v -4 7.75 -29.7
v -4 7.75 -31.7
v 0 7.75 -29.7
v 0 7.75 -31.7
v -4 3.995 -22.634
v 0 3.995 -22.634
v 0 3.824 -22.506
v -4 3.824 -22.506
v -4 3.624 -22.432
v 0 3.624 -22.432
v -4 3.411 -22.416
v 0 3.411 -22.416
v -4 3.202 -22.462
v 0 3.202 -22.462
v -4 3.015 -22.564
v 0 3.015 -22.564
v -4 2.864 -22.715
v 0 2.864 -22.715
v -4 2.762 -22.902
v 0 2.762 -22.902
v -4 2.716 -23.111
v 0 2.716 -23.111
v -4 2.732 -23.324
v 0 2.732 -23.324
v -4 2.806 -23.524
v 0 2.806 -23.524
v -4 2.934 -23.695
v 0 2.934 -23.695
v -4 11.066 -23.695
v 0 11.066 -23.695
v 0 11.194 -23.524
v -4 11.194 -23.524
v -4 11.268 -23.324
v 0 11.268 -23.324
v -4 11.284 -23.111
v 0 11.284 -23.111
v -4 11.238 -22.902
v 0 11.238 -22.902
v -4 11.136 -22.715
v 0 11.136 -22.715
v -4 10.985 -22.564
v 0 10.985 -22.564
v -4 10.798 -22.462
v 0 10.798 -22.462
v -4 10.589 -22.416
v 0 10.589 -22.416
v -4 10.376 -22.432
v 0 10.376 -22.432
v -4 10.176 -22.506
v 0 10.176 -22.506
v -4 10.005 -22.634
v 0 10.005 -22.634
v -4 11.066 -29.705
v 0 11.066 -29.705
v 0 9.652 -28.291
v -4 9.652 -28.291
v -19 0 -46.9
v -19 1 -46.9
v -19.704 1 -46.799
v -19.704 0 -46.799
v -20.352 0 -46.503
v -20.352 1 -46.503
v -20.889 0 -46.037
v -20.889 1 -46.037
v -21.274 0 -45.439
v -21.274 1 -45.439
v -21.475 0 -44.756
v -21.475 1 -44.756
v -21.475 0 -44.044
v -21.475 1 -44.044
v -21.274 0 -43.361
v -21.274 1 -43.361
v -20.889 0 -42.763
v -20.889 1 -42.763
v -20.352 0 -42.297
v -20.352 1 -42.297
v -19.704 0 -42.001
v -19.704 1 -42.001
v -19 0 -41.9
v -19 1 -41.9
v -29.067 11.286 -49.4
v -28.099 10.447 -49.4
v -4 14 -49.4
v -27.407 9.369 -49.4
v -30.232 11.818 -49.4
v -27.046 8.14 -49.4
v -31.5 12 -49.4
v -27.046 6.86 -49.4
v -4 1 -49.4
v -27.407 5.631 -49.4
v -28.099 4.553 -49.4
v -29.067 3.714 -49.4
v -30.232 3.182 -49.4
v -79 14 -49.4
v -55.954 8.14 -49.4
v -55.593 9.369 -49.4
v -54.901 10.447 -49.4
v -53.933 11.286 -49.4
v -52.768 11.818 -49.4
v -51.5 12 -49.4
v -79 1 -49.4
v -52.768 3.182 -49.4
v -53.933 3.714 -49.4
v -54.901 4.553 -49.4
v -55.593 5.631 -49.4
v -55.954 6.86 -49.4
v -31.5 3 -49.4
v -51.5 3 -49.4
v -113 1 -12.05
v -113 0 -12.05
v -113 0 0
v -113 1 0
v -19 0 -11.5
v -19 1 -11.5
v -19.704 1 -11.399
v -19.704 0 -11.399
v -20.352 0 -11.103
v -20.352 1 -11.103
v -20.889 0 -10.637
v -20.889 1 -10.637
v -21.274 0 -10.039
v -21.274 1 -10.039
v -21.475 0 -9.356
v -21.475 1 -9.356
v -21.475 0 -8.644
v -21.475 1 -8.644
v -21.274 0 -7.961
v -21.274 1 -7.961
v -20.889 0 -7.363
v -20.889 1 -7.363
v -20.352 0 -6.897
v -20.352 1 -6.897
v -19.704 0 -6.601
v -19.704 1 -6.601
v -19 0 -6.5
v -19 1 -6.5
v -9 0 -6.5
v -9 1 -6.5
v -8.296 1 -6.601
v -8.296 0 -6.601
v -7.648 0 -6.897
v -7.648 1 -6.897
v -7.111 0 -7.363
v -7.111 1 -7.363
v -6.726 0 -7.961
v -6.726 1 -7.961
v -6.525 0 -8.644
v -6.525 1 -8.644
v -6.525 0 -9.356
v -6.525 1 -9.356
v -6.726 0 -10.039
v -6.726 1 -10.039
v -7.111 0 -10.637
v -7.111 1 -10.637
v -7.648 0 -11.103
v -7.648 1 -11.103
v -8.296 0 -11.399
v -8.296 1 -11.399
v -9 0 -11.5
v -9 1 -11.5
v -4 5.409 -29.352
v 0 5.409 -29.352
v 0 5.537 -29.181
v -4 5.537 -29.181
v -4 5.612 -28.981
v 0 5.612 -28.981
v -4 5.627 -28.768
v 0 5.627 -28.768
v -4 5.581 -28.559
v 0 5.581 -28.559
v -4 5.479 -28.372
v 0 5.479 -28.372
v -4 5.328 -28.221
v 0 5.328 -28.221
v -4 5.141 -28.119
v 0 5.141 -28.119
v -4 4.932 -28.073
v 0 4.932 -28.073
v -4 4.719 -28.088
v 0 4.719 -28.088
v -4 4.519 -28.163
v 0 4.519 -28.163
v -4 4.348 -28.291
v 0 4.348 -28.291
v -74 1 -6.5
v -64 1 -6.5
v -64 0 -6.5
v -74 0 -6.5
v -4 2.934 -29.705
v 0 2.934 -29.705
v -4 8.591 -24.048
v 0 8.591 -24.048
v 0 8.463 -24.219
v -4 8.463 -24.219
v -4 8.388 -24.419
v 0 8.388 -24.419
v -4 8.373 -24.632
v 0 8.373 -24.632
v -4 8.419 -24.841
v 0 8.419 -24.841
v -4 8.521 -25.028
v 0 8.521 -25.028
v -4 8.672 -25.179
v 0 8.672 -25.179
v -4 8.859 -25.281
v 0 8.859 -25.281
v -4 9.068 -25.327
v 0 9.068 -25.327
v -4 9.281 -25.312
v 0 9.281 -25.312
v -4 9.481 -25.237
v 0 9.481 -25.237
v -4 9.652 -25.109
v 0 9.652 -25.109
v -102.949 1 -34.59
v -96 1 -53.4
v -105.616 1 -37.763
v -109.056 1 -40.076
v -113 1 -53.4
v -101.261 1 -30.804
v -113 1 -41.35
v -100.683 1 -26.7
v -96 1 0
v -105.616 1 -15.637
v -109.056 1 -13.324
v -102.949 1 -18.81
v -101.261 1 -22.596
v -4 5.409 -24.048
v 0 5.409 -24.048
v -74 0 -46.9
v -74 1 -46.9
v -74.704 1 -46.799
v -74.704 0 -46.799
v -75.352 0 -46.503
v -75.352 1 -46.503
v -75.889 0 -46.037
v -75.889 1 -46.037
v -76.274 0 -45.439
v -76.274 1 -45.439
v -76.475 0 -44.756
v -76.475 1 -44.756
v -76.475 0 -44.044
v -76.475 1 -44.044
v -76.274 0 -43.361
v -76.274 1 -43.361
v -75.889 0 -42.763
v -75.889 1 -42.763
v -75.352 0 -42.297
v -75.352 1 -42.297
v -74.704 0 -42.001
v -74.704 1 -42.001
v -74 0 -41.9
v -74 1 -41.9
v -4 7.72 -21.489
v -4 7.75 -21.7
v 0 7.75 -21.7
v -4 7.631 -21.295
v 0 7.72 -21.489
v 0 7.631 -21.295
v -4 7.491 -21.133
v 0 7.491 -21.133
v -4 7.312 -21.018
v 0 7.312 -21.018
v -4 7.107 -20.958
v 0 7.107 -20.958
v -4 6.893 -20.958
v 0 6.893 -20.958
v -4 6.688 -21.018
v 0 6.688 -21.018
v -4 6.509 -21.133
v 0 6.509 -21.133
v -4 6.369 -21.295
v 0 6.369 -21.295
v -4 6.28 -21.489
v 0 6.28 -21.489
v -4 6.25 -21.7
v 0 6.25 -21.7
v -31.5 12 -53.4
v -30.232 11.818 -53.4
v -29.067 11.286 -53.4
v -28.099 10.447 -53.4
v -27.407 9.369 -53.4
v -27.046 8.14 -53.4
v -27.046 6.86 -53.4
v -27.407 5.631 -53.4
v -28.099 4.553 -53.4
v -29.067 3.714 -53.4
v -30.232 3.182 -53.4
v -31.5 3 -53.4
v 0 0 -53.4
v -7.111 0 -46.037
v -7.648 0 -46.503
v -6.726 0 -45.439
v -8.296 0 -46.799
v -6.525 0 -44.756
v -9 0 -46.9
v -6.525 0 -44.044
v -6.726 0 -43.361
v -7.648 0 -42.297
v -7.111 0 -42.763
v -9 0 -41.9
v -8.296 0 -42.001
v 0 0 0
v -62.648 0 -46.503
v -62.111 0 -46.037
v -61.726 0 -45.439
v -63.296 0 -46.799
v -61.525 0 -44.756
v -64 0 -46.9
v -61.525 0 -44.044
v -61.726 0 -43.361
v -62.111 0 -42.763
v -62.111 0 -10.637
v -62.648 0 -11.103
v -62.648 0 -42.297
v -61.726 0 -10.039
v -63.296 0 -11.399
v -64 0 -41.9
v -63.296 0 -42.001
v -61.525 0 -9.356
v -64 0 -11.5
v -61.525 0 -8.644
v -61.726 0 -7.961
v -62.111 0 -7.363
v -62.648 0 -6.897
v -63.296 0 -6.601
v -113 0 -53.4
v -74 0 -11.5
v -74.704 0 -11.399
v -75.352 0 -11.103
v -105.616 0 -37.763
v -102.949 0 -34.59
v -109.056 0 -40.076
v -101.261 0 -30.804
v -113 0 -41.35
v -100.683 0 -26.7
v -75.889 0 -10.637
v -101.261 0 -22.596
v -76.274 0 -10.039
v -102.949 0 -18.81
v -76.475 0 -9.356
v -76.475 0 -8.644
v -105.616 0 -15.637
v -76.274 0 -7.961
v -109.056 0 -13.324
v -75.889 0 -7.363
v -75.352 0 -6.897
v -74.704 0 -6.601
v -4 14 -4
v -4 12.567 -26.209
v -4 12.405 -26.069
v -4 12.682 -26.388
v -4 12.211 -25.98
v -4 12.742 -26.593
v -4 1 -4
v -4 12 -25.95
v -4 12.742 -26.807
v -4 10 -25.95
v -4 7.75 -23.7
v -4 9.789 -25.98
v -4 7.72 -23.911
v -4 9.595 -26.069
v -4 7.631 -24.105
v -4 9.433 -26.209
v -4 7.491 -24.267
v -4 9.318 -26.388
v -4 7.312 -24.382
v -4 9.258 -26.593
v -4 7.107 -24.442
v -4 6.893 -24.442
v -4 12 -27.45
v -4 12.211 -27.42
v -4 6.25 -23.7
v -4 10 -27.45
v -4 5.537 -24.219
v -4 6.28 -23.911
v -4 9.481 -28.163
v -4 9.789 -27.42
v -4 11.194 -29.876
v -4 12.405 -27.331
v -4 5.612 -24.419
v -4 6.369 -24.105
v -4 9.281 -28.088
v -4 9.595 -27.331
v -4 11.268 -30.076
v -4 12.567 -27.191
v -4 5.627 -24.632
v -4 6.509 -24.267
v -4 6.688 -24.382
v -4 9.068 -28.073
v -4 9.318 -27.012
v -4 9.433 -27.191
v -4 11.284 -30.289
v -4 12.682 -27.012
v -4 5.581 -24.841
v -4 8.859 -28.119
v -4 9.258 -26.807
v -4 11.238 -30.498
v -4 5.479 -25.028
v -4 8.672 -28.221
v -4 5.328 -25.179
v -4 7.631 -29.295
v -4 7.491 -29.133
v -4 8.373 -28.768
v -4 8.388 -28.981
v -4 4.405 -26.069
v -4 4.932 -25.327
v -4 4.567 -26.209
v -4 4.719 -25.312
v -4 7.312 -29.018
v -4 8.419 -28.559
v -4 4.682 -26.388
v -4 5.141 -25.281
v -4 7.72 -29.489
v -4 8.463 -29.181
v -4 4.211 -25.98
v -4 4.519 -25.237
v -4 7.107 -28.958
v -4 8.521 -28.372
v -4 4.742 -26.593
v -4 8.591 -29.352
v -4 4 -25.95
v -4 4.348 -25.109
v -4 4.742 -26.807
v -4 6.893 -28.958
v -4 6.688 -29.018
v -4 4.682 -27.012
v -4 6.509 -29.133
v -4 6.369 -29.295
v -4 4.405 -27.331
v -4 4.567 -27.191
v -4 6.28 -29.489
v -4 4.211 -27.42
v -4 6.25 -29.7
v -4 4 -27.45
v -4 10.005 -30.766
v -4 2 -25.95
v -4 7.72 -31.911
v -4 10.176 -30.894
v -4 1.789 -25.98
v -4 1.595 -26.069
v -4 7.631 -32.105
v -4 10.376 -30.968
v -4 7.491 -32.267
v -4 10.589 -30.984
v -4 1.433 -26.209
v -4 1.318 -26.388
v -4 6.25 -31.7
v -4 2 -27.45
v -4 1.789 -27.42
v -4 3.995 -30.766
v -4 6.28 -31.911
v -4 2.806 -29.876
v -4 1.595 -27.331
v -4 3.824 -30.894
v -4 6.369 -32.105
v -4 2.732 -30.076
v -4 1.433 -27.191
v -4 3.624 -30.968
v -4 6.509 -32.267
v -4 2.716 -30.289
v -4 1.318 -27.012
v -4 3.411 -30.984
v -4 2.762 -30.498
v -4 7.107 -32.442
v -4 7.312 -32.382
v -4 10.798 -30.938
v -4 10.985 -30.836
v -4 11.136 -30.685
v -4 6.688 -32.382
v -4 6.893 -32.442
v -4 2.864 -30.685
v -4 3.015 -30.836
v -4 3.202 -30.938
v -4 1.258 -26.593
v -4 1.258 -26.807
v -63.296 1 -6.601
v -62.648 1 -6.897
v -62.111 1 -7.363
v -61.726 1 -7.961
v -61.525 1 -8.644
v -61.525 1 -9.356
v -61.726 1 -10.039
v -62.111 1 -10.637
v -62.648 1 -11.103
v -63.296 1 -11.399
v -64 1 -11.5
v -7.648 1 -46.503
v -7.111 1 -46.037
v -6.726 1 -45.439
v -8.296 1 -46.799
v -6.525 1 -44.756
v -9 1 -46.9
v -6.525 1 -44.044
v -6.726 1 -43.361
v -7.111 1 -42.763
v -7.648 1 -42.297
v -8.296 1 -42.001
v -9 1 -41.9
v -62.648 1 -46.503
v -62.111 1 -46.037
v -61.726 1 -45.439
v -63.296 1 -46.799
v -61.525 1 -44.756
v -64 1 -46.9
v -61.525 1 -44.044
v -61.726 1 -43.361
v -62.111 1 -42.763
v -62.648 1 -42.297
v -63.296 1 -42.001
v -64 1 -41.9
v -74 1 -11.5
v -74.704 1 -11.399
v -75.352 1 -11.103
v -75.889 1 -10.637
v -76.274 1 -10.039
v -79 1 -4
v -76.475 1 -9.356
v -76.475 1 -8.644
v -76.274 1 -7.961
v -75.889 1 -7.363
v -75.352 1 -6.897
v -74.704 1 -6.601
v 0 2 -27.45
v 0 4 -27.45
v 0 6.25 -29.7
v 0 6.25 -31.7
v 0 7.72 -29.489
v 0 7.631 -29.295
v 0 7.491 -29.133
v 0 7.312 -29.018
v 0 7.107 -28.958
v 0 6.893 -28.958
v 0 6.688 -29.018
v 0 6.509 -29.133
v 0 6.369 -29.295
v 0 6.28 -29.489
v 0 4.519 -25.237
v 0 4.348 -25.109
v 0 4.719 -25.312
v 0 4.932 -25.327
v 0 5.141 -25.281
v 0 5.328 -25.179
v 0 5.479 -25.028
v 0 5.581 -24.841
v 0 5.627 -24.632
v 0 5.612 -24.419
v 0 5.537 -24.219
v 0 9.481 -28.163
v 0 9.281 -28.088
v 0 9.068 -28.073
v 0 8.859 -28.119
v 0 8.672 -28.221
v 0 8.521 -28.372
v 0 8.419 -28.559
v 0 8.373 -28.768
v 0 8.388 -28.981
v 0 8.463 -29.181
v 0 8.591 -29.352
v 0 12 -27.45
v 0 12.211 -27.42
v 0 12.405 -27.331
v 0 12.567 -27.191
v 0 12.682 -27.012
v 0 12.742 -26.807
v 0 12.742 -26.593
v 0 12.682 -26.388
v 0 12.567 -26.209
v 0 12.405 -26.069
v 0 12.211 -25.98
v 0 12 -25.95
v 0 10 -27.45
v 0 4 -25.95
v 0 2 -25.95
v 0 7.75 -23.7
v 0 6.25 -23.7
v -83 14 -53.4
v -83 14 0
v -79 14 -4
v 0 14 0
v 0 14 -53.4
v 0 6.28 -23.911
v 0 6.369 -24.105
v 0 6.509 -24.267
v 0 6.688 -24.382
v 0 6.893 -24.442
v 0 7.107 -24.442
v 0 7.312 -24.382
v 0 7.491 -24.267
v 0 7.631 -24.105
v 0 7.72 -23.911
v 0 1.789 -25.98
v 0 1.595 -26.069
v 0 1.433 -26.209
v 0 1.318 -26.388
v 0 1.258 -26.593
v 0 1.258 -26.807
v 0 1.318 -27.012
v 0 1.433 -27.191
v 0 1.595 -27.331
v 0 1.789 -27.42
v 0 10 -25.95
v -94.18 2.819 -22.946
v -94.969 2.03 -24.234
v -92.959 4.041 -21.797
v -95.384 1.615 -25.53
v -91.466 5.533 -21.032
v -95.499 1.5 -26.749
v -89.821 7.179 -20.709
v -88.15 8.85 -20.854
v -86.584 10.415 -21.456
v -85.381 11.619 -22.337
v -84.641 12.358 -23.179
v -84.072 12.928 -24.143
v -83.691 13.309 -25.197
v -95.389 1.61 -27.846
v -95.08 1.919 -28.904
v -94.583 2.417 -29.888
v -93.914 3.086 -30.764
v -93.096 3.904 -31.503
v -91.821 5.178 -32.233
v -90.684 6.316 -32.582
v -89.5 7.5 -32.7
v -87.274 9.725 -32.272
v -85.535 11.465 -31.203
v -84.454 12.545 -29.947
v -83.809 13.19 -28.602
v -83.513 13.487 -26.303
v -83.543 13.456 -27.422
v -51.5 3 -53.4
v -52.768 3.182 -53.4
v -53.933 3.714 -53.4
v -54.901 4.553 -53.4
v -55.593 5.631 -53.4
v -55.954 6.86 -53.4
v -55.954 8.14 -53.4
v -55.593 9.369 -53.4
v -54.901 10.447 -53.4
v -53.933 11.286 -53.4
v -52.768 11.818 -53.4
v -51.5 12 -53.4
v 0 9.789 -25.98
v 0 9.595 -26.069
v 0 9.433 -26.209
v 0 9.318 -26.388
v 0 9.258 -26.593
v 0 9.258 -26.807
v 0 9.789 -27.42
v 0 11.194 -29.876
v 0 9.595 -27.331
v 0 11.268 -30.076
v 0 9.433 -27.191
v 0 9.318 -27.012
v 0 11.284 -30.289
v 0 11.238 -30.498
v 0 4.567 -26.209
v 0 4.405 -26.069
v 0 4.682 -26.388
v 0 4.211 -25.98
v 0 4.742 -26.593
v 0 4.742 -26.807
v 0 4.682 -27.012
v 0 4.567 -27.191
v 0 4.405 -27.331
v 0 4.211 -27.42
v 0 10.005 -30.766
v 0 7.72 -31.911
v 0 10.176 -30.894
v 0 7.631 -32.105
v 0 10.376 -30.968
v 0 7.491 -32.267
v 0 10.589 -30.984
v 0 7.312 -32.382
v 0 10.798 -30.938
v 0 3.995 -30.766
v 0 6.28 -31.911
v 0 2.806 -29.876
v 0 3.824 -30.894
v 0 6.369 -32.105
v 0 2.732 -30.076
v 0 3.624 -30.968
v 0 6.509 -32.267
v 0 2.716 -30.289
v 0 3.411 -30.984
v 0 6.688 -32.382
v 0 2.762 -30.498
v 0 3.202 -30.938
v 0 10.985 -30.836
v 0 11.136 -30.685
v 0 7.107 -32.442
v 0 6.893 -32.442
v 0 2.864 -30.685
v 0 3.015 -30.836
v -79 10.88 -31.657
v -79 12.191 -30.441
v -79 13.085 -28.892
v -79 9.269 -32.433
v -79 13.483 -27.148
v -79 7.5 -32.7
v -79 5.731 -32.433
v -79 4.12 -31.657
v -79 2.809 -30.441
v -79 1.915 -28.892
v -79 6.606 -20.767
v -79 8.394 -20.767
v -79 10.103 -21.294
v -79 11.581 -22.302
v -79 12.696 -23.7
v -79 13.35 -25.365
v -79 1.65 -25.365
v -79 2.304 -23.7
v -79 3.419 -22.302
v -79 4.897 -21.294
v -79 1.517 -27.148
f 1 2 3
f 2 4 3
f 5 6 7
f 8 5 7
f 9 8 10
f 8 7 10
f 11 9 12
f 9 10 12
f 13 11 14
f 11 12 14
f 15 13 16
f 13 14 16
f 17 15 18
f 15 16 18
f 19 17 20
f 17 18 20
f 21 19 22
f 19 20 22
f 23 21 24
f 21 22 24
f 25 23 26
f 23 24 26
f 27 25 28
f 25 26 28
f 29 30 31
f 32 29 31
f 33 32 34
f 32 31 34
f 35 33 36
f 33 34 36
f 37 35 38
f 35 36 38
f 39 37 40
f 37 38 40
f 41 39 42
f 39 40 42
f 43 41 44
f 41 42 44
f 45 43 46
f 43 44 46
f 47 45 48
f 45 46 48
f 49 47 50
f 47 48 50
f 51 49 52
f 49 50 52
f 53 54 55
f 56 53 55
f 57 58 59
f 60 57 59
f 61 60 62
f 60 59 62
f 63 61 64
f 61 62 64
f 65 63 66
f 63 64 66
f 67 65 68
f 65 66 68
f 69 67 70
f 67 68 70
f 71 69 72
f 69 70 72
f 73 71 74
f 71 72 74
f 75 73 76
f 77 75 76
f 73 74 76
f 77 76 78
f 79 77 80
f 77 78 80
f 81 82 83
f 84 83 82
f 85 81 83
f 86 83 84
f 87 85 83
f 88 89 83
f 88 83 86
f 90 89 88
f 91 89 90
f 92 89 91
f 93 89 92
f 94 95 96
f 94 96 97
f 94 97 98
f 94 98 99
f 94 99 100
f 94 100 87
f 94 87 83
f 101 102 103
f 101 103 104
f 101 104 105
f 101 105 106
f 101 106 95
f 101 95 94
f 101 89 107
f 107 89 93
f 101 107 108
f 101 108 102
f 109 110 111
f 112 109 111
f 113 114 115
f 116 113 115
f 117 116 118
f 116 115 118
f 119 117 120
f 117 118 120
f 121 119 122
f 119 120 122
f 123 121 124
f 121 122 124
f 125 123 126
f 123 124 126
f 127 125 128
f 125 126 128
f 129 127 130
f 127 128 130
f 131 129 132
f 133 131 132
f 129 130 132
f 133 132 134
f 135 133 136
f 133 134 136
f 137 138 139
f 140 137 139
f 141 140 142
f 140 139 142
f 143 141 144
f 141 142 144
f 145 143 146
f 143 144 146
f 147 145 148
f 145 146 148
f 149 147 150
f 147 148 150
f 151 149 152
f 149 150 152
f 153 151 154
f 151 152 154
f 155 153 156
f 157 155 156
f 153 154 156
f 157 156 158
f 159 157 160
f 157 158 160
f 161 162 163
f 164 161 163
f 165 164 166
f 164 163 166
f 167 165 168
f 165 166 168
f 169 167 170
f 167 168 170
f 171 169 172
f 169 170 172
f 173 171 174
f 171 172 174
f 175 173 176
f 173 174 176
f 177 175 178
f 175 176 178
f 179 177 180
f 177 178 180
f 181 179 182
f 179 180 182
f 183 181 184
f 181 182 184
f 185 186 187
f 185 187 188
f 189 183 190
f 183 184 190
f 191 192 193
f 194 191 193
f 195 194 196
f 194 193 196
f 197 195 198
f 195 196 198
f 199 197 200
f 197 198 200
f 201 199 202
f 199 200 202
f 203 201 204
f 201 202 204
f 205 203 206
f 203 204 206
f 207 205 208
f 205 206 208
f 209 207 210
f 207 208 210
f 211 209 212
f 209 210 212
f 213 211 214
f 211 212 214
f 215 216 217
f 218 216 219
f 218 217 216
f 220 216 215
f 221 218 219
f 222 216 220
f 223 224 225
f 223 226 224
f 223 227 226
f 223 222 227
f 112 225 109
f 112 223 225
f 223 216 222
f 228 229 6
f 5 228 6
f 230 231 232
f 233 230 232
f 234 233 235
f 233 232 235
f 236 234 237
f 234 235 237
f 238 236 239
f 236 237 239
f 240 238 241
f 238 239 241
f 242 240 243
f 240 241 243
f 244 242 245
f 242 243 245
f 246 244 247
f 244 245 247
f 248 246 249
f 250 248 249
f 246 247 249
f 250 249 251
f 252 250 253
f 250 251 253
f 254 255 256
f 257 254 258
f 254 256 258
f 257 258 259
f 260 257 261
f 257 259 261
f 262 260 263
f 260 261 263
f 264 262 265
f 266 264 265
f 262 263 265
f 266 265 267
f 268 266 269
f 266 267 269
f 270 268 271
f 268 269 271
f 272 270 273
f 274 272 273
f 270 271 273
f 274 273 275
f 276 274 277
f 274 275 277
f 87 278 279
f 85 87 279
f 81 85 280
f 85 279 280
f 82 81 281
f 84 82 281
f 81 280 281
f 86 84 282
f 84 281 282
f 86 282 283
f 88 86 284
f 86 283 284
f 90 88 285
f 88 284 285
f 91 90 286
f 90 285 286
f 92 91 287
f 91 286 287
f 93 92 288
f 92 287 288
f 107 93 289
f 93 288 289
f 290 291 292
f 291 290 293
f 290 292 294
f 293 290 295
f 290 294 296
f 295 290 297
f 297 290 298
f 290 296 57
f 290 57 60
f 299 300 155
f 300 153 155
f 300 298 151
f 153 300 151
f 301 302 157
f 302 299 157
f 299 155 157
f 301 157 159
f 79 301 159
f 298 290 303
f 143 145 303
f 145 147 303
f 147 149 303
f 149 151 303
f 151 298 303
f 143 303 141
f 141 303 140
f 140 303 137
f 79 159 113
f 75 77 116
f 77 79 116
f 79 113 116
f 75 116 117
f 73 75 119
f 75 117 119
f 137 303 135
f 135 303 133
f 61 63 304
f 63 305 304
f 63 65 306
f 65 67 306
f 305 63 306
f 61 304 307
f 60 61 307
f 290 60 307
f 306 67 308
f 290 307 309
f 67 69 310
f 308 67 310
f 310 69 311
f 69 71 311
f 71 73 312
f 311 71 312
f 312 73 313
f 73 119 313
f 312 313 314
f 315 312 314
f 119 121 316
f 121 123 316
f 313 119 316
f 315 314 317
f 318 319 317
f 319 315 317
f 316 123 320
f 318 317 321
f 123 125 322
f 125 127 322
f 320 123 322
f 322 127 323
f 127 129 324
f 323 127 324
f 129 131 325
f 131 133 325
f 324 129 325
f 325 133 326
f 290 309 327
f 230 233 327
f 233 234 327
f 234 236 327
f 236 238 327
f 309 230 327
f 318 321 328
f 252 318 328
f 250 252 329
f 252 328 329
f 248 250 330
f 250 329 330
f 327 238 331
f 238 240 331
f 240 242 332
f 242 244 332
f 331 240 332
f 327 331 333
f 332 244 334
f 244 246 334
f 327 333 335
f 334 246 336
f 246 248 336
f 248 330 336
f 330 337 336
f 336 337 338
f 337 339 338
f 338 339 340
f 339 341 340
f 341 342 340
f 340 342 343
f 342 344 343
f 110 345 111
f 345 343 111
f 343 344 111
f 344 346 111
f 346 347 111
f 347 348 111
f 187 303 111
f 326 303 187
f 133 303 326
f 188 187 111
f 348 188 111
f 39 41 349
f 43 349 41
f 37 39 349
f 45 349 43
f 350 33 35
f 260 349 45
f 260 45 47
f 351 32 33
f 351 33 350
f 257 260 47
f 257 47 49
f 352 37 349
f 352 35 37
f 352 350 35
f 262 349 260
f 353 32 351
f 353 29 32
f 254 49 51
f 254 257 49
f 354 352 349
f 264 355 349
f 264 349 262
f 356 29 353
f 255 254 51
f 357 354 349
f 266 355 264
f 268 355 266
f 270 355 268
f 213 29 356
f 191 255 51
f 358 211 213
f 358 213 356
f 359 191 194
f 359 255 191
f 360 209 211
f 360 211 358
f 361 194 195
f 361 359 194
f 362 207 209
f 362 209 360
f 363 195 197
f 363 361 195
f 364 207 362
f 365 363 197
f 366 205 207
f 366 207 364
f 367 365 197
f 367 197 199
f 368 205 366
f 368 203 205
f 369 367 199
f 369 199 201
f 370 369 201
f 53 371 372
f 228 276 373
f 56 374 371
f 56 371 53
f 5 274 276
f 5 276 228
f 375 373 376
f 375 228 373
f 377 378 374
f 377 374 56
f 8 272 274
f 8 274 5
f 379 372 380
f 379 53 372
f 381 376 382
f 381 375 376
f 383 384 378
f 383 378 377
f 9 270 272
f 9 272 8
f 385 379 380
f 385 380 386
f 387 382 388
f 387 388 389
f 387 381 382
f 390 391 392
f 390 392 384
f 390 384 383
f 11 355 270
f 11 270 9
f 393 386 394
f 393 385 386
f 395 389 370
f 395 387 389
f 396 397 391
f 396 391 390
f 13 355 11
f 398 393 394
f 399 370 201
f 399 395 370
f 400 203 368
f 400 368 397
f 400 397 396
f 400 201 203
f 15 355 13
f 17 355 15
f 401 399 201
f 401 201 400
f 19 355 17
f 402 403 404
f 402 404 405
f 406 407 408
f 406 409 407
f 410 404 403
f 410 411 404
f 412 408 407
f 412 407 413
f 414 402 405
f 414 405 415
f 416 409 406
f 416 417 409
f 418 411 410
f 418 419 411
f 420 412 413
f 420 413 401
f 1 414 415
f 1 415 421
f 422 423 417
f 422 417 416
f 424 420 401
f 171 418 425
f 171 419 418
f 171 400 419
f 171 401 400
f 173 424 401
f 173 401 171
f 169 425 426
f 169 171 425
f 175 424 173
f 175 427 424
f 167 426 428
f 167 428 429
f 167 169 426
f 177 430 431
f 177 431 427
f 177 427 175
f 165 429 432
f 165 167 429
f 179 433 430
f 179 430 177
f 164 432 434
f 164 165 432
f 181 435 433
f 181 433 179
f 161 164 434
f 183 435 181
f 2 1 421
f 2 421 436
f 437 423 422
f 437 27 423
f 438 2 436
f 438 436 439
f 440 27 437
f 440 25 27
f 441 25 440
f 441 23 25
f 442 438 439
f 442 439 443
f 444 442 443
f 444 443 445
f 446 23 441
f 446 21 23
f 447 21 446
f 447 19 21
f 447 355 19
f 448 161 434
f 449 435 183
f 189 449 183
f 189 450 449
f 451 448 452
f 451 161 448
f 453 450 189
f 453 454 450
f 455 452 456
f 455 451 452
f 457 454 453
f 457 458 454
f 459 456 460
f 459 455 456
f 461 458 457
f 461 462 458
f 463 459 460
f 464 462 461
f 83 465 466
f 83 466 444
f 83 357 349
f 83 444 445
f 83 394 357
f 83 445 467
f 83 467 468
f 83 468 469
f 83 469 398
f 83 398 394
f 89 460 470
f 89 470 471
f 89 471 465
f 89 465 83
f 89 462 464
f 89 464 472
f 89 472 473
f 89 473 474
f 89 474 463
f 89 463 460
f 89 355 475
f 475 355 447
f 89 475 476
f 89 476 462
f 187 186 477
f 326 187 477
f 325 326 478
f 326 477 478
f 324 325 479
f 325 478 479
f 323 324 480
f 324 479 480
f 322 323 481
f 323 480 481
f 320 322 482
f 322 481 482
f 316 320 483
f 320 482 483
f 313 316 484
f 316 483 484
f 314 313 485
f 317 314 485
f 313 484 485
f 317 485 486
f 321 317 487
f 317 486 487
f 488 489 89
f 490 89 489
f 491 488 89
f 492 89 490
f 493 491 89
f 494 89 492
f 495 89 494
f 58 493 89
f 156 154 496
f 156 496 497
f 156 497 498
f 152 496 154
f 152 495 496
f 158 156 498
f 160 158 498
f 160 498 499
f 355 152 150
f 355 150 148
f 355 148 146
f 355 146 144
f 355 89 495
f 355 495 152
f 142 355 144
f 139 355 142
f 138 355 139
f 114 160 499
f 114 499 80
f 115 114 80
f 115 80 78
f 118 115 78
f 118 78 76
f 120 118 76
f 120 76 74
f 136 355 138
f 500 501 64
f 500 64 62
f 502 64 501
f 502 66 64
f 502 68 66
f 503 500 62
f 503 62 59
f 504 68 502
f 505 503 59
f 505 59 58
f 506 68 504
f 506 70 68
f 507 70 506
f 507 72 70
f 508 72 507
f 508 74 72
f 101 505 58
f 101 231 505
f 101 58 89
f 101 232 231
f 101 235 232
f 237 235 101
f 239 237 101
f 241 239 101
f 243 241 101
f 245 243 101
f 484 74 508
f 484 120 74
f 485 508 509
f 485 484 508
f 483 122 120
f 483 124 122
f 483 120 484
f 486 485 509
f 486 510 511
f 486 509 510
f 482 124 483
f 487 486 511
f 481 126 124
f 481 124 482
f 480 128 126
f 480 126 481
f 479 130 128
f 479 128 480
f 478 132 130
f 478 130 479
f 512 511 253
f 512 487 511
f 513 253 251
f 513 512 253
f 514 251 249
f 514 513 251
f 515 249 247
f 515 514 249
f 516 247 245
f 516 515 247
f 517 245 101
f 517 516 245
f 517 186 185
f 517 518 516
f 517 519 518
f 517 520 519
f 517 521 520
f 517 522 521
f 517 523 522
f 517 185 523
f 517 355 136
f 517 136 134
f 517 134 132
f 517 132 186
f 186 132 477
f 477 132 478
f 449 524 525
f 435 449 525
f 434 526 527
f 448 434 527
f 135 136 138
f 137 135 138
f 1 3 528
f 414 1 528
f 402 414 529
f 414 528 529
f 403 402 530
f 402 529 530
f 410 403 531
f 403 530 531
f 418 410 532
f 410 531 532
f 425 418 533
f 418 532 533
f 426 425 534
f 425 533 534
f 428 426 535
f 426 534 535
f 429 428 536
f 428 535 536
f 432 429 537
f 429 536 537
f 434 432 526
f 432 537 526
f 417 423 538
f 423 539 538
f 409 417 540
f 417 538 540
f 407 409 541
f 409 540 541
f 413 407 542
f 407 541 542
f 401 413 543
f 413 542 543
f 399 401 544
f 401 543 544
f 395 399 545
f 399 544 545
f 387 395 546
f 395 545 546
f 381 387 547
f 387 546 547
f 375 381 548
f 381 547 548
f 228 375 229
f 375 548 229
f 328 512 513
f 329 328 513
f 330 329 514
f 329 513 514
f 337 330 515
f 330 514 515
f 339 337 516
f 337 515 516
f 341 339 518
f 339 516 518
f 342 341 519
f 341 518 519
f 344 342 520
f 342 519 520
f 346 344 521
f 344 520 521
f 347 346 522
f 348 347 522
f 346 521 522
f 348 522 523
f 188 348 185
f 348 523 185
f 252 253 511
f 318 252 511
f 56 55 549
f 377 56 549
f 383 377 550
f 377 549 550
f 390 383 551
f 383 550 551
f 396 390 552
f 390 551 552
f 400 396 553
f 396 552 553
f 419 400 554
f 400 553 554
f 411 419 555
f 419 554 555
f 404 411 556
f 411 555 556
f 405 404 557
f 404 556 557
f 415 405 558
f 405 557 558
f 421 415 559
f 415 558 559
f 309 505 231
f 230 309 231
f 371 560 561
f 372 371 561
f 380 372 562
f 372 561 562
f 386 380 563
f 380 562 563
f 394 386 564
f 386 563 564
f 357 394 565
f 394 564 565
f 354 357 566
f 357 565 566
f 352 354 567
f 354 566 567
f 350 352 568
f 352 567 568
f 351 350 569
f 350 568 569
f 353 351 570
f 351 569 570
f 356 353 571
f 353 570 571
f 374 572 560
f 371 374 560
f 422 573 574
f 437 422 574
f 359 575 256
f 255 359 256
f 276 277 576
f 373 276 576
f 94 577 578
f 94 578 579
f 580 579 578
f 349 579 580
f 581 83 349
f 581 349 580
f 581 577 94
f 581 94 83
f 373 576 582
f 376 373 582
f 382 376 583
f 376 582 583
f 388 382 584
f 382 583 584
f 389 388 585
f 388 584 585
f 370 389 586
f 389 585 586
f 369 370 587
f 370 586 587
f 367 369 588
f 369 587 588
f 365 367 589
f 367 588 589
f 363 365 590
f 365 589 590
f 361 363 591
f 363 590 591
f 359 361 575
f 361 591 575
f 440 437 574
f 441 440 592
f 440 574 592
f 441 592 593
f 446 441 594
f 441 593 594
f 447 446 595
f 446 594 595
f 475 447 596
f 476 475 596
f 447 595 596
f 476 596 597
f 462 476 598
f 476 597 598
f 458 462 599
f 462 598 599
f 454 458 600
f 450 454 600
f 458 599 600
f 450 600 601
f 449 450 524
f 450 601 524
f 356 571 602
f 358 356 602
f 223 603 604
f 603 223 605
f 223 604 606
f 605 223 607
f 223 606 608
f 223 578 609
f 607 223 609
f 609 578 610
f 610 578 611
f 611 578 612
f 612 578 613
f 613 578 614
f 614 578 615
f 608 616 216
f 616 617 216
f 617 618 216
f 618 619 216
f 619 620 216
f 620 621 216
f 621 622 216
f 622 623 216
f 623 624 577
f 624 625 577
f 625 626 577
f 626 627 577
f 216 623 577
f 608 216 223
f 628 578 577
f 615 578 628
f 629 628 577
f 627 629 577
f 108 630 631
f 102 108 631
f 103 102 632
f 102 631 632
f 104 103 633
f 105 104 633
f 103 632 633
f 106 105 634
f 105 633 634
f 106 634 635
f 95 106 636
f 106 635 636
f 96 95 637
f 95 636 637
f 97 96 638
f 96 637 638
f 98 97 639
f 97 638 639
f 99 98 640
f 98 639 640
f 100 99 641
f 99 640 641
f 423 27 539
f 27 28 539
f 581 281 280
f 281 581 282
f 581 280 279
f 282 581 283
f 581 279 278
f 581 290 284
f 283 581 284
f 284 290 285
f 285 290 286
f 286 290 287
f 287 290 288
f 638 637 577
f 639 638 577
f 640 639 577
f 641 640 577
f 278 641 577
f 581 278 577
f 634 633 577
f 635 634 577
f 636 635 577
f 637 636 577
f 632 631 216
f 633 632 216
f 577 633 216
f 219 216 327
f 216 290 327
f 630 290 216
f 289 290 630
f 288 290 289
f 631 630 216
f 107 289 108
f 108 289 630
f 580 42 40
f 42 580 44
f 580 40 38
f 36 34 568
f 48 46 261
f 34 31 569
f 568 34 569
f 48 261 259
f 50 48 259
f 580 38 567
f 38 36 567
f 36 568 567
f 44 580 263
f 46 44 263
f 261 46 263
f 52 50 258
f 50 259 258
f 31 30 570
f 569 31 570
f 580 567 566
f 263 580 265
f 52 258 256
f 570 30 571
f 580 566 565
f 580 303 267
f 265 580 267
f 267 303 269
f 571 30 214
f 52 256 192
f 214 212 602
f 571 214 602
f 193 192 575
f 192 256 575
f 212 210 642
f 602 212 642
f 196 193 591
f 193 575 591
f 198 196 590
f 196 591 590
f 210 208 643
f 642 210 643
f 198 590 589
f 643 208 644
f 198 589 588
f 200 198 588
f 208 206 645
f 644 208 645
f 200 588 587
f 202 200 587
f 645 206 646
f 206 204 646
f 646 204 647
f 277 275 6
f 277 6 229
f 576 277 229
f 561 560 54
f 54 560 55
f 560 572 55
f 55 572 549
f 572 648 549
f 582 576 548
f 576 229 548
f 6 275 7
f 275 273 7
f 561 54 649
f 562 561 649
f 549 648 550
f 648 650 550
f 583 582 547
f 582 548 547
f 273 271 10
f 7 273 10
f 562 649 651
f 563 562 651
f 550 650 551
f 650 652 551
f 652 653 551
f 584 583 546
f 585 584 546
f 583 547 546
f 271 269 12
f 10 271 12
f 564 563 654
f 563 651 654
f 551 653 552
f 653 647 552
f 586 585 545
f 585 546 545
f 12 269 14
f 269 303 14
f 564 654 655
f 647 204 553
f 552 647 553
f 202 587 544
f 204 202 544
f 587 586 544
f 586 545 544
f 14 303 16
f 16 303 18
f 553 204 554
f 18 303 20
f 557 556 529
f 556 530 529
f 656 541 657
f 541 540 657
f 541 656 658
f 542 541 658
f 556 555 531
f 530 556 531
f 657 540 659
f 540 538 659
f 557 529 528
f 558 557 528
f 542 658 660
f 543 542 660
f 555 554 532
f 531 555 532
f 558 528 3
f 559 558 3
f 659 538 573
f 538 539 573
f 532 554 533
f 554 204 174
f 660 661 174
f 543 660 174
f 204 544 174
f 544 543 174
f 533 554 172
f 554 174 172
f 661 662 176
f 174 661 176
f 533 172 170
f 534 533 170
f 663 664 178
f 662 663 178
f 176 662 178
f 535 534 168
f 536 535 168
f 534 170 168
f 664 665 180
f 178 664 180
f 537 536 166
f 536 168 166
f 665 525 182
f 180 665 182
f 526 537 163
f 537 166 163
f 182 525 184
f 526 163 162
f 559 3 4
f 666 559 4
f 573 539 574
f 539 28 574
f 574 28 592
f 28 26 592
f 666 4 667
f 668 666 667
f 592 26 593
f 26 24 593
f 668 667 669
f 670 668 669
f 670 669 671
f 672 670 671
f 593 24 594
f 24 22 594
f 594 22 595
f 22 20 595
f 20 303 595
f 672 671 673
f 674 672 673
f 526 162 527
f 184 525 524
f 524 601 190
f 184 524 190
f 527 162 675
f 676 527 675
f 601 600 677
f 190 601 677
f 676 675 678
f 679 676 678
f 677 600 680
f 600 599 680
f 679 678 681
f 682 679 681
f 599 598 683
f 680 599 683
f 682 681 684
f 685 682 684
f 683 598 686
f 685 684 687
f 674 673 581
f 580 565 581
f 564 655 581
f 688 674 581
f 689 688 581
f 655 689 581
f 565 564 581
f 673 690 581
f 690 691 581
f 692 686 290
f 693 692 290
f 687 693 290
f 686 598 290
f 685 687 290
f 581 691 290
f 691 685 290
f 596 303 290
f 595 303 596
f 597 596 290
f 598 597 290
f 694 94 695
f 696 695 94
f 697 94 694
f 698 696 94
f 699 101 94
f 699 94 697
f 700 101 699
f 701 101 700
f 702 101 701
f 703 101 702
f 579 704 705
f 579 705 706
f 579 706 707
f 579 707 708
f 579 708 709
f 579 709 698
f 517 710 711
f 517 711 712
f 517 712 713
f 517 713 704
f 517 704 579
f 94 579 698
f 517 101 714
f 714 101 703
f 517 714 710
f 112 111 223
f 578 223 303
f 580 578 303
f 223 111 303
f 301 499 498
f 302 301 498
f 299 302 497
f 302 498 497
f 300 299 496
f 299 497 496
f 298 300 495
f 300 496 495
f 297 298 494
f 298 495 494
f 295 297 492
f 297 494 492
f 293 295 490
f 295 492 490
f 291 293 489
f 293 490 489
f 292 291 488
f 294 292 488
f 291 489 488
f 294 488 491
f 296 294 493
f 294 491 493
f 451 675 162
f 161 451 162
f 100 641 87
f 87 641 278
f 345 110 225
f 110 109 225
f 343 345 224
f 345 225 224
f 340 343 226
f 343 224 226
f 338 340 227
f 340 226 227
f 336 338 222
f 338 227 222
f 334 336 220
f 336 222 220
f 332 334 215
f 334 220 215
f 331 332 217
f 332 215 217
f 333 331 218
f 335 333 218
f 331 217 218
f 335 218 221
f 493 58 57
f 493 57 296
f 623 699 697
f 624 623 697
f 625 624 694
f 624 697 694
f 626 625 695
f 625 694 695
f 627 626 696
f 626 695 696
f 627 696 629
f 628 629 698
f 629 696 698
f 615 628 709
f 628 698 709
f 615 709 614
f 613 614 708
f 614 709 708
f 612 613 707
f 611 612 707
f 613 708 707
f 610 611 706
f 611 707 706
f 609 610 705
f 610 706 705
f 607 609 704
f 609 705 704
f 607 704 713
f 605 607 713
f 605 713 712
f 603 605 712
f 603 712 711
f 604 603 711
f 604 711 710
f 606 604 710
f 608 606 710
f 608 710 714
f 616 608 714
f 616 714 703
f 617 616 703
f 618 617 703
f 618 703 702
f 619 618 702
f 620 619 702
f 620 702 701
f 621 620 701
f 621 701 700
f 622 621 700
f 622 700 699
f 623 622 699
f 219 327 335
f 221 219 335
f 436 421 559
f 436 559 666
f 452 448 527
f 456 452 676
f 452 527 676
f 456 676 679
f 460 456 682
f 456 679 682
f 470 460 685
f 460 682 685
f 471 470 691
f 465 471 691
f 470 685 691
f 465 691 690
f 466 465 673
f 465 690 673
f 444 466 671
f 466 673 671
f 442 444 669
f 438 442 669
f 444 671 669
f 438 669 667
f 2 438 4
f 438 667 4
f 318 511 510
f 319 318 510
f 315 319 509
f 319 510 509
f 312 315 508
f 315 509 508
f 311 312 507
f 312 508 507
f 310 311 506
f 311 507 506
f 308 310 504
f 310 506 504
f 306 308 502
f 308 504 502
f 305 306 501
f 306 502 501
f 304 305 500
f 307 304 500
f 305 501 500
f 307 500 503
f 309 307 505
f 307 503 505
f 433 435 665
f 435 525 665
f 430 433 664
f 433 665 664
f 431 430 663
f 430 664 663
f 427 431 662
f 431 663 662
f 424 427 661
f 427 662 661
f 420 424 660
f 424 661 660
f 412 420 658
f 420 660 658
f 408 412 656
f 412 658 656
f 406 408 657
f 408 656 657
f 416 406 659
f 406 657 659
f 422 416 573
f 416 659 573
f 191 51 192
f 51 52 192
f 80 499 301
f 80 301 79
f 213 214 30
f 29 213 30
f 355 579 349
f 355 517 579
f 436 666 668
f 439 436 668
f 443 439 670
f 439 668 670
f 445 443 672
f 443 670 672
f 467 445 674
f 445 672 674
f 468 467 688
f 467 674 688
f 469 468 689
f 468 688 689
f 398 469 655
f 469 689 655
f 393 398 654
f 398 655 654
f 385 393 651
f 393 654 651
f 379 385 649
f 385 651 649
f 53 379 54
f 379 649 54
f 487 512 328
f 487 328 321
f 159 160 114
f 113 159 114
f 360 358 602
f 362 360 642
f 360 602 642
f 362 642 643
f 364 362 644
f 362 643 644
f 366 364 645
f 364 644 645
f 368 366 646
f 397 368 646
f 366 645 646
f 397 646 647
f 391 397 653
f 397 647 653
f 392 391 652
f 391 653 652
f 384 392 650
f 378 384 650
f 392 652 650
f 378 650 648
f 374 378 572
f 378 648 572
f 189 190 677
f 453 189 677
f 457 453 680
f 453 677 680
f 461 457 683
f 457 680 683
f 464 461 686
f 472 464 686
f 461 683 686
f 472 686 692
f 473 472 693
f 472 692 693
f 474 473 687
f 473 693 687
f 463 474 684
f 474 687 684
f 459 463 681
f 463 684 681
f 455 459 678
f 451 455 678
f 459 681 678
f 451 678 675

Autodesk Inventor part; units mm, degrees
ref_plane "YZ Plane" through (0, 0, 0) normal (1, 0, 0) x (0, 1, 0)
ref_plane "XZ Plane" through (0, 0, 0) normal (0, 1, 0) x (-1, 0, 0)
ref_plane "XY Plane" through (0, 0, 0) normal (0, 0, 1) x (1, 0, 0)
sketch "Szkic1" plane through (0, 0, 0) normal (0, 1, 0) x (-1, 0, 0)
  line L0 (0, 0) -> (0, -53.4)
  line L1 (0, -53.4) -> (113, -53.4)
  line L2 (0, -53.4) -> (113, -53.4) construction
  line L3 (0, -53.4) -> (113, -53.4)
  line L4 (113, -53.4) -> (113, 0)
  line L5 (113, 0) -> (0, 0)
  line L6 (0, 0) -> (0, -53.4)
  dimension "d0" = 53.4
  dimension "d1" = 113
  dimension "d2" = 0
extrude "Wyciągnięcie proste1" add sketch "Szkic1" along normal blind 1
sketch "Szkic2" plane through (0, 1, 0) normal (0, 1, 0) x (1, 0, 0)
  line L0 (-113, 53.4) -> (-113, 0) projected
  line L1 (-113, 0) -> (-83, 0)
  line L2 (-113, 0) -> (0, 0) projected
  line L3 (-83, 0) -> (-83, 53.4)
  line L4 (0, 53.4) -> (-113, 53.4) projected
  line L5 (-83, 0) -> (0, 0)
  line L6 (0, 0) -> (0, 53.4)
  line L7 (0, 53.4) -> (-83, 53.4)
  line L8 (-83, 53.4) -> (-83, 0)
  line L9 (-83, 0) -> (-79, 0)
  line L10 (-79, 0) -> (-79, 4)
  line L11 (0, 53.4) -> (-4, 53.4)
  line L12 (-4, 53.4) -> (-4, 49.4)
  line L13 (-79, 4) -> (-4, 4)
  line L14 (-4, 4) -> (-4, 49.4)
  line L15 (-4, 49.4) -> (-79, 49.4)
  line L16 (-79, 49.4) -> (-79, 4)
  dimension "d5" = 30
  dimension "d6" = 4
  dimension "d7" = 4
  dimension "d8" = 4
  dimension "d9" = 4
extrude "Wyciągnięcie proste2" add sketch "Szkic2" along normal blind 13 contours L4 L12 L15 L16 L10 L2 L3 | L4 L6 L2 L10 L13 L14 L12
sketch "Szkic3" plane through (0, 1, 0) normal (0, 1, 0) x (1, 0, 0)
  line L0 (-113, 53.4) -> (-113, 0) projected
  line L1 (-113, 26.7) -> (-113, 12.05)
  line L2 (-113, 26.7) -> (-113, 41.35)
  arc A0 (-113, 12.05) -> (-113, 41.35) centre (-115.5542, 26.7) ccw
  point P0 (0, 0)
  dimension "d12" = 14.65
  dimension "d13" = 14.65
  dimension "d14" = 14.871
extrude "Wyciągnięcie proste3" cut sketch "Szkic3" against normal blind 13
chamfer "Faza1" distance 13 angle 45 1 edges at (-83, 1, -26.7)
sketch "Szkic4" plane through (-79, 1, -4) normal (1, 0, 0) x (0, 0, -1)
  line L0 (45.4, 0) -> (0, 0) projected
  line L1 (22.7, 0) -> (22.7, 13)
  line L2 (0, 13) -> (45.4, 13) projected
  circle A0 centre (22.7, 6.5) radius 6
  point P0 (-4, -1)
  dimension "d20" = 12
extrude "Wyciągnięcie proste4" cut sketch "Szkic4" against normal through all
sketch "Szkic5" plane through (0, 0, 0) normal (1, 0, 0) x (0, 0, -1)
  line L0 (0, 0) -> (0, 14) projected
  line L1 (0, 7) -> (53.4, 7)
  line L2 (53.4, 0) -> (53.4, 14) projected
  line L3 (4, 14) -> (49.4, 14) projected
  line L4 (26.7, 14) -> (26.7, 0)
  line L5 (0, 0) -> (53.4, 0) projected
  circle A0 centre (26.7, 7) radius 2
  line L6 (26.7, 9) -> (26.7, 10)
  line L7 (26.7, 10) -> (26.7, 12) construction
  line L8 (27.45, 10) -> (27.45, 12)
  line L9 (25.95, 12) -> (25.95, 10)
  arc A1 (25.95, 10) -> (27.45, 10) centre (26.7, 10) ccw
  arc A2 (27.45, 12) -> (25.95, 12) centre (26.7, 12) ccw
  line L10 (28.1142, 8.4142) -> (28.8213, 9.1213)
  line L11 (28.8213, 9.1213) -> (30.2355, 10.5355) construction
  line L12 (29.7052, 11.0659) -> (28.291, 9.6517)
  arc A3 (28.291, 9.6517) -> (29.3517, 8.591) centre (28.8213, 9.1213) ccw
  arc A4 (30.7659, 10.0052) -> (29.7052, 11.0659) centre (30.2355, 10.5355) ccw
  line L13 (29.3517, 8.591) -> (30.7659, 10.0052)
  line L14 (28.7, 7) -> (29.7, 7)
  line L15 (29.7, 7) -> (31.7, 7) construction
  line L16 (31.7, 7.75) -> (29.7, 7.75)
  arc A5 (29.7, 7.75) -> (29.7, 6.25) centre (29.7, 7) ccw
  arc A6 (31.7, 6.25) -> (31.7, 7.75) centre (31.7, 7) ccw
  line L17 (29.7, 6.25) -> (31.7, 6.25)
  line L18 (28.1142, 5.5858) -> (28.8213, 4.8787)
  line L19 (28.8213, 4.8787) -> (30.2355, 3.4645) construction
  line L20 (30.7659, 3.9948) -> (29.3517, 5.409)
  arc A7 (29.3517, 5.409) -> (28.291, 4.3483) centre (28.8213, 4.8787) ccw
  arc A8 (29.7052, 2.9341) -> (30.7659, 3.9948) centre (30.2355, 3.4645) ccw
  line L21 (28.291, 4.3483) -> (29.7052, 2.9341)
  line L22 (26.7, 5) -> (26.7, 4)
  line L23 (26.7, 4) -> (26.7, 2) construction
  line L24 (27.45, 2) -> (27.45, 4)
  arc A9 (27.45, 4) -> (25.95, 4) centre (26.7, 4) ccw
  arc A10 (25.95, 2) -> (27.45, 2) centre (26.7, 2) ccw
  line L25 (25.95, 4) -> (25.95, 2)
  line L26 (25.2858, 5.5858) -> (24.5787, 4.8787)
  line L27 (24.5787, 4.8787) -> (23.1645, 3.4645) construction
  line L28 (23.6948, 2.9341) -> (25.109, 4.3483)
  arc A11 (25.109, 4.3483) -> (24.0483, 5.409) centre (24.5787, 4.8787) ccw
  arc A12 (22.6341, 3.9948) -> (23.6948, 2.9341) centre (23.1645, 3.4645) ccw
  line L29 (24.0483, 5.409) -> (22.6341, 3.9948)
  line L30 (24.7, 7) -> (23.7, 7)
  line L31 (23.7, 7) -> (21.7, 7) construction
  line L32 (21.7, 6.25) -> (23.7, 6.25)
  arc A13 (23.7, 6.25) -> (23.7, 7.75) centre (23.7, 7) ccw
  arc A14 (21.7, 7.75) -> (21.7, 6.25) centre (21.7, 7) ccw
  line L33 (23.7, 7.75) -> (21.7, 7.75)
  line L34 (25.2858, 8.4142) -> (24.5787, 9.1213)
  line L35 (24.5787, 9.1213) -> (23.1645, 10.5355) construction
  line L36 (22.6341, 10.0052) -> (24.0483, 8.591)
  arc A15 (24.0483, 8.591) -> (25.109, 9.6517) centre (24.5787, 9.1213) ccw
  arc A16 (23.6948, 11.0659) -> (22.6341, 10.0052) centre (23.1645, 10.5355) ccw
  line L37 (25.109, 9.6517) -> (23.6948, 11.0659)
  point P0 (26.7, 11)
  point P1 (29.5284, 9.8284)
  point P2 (30.7, 7)
  point P3 (29.5284, 4.1716)
  point P4 (26.7, 3)
  point P5 (23.8716, 4.1716)
  point P6 (22.7, 7)
  point P7 (23.8716, 9.8284)
  dimension "d23" = 4
  dimension "d24" = 1
  dimension "d25" = 2
  dimension "d26" = 1.5
  dimension "d29" = 360
extrude "Wyciągnięcie proste5" cut sketch "Szkic5" against normal blind 10 contours A15 L36 A16 L37 | A1 L9 A2 L4 | L4 A2 L8 A1 | A3 L12 A4 L13 | A11 L28 A12 L29 | A7 L20 A8 L21 | A14 L33 A13 L1 | L1 A13 L32 A14 | A10 L25 A9 L4 | L4 A9 L24 A10 | A6 L17 A5 L1 | L1 A5 L16 A6
sketch "Szkic6" plane through (0, 1, 0) normal (0, 1, 0) x (1, 0, 0)
  line L0 (-4, 4) -> (-4, 49.4) projected
  line L1 (-4, 4) -> (-4, 9)
  line L2 (-4, 9) -> (-9, 9)
  line L3 (-9, 9) -> (-19, 9) construction
  line L4 (-9, 11.5) -> (-19, 11.5)
  line L5 (-19, 6.5) -> (-9, 6.5)
  arc A0 (-9, 6.5) -> (-9, 11.5) centre (-9, 9) ccw
  arc A1 (-19, 11.5) -> (-19, 6.5) centre (-19, 9) ccw
  line L6 (-4, 26.7) -> (-79, 26.7)
  line L7 (-79, 49.4) -> (-79, 4) projected
  line L8 (-79, 4) -> (-4, 4) projected
  line L9 (-41.5, 4) -> (-41.5, 49.4)
  line L10 (-4, 49.4) -> (-79, 49.4) projected
  line L11 (-74, 9) -> (-64, 9) construction
  line L12 (-74, 11.5) -> (-64, 11.5)
  line L13 (-64, 6.5) -> (-74, 6.5)
  arc A2 (-74, 11.5) -> (-74, 6.5) centre (-74, 9) ccw
  arc A3 (-64, 6.5) -> (-64, 11.5) centre (-64, 9) ccw
  line L14 (-4, 44.4) -> (-9, 44.4)
  line L15 (-9, 44.4) -> (-19, 44.4) construction
  line L16 (-9, 41.9) -> (-19, 41.9)
  line L17 (-19, 46.9) -> (-9, 46.9)
  arc A4 (-9, 41.9) -> (-9, 46.9) centre (-9, 44.4) ccw
  arc A5 (-19, 46.9) -> (-19, 41.9) centre (-19, 44.4) ccw
  line L18 (-41.5, 49.4) -> (-41.5, 4)
  arc A6 (-74, 46.9) -> (-74, 41.9) centre (-74, 44.4) ccw
  line L19 (-74, 44.4) -> (-64, 44.4) construction
  line L20 (-64, 46.9) -> (-74, 46.9)
  line L21 (-74, 41.9) -> (-64, 41.9)
  arc A7 (-64, 41.9) -> (-64, 46.9) centre (-64, 44.4) ccw
  point P0 (0, 0)
  point P1 (-14, 9)
  point P2 (-69, 9)
  point P3 (-14, 44.4)
  point P4 (-69, 44.4)
  dimension "d33" = 5
  dimension "d34" = 5
  dimension "d35" = 10
  dimension "d36" = 5
extrude "Wyciągnięcie proste6" cut sketch "Szkic6" against normal blind 10 contours A0 L5 A1 L4 | A4 L16 A5 L17 | L12 A3 L13 A2 | L20 A7 L21 A6
sketch "Szkic7" plane through (0, 0, -53.4) normal (0, 0, -1) x (-1, 0, 0)
  line L0 (79, 1) -> (4, 1) projected
  line L1 (41.5, 1) -> (41.5, 14)
  line L2 (4, 14) -> (79, 14) projected
  line L3 (79, 1.5) -> (79, 13.5) projected
  line L4 (79, 7.5) -> (41.5, 7.5)
  line L5 (41.5, 7.5) -> (31.5, 7.5)
  line L6 (31.5, 7.5) -> (51.5, 7.5) construction
  line L7 (31.5, 3) -> (51.5, 3)
  line L8 (51.5, 12) -> (31.5, 12)
  arc A0 (31.5, 12) -> (31.5, 3) centre (31.5, 7.5) ccw
  arc A1 (51.5, 3) -> (51.5, 12) centre (51.5, 7.5) ccw
  point P0 (0, 0)
  dimension "d39" = 10
  dimension "d40" = 20
  dimension "d41" = 9
extrude "Wyciągnięcie proste7" cut sketch "Szkic7" against normal blind 10
properties part number "klp"
